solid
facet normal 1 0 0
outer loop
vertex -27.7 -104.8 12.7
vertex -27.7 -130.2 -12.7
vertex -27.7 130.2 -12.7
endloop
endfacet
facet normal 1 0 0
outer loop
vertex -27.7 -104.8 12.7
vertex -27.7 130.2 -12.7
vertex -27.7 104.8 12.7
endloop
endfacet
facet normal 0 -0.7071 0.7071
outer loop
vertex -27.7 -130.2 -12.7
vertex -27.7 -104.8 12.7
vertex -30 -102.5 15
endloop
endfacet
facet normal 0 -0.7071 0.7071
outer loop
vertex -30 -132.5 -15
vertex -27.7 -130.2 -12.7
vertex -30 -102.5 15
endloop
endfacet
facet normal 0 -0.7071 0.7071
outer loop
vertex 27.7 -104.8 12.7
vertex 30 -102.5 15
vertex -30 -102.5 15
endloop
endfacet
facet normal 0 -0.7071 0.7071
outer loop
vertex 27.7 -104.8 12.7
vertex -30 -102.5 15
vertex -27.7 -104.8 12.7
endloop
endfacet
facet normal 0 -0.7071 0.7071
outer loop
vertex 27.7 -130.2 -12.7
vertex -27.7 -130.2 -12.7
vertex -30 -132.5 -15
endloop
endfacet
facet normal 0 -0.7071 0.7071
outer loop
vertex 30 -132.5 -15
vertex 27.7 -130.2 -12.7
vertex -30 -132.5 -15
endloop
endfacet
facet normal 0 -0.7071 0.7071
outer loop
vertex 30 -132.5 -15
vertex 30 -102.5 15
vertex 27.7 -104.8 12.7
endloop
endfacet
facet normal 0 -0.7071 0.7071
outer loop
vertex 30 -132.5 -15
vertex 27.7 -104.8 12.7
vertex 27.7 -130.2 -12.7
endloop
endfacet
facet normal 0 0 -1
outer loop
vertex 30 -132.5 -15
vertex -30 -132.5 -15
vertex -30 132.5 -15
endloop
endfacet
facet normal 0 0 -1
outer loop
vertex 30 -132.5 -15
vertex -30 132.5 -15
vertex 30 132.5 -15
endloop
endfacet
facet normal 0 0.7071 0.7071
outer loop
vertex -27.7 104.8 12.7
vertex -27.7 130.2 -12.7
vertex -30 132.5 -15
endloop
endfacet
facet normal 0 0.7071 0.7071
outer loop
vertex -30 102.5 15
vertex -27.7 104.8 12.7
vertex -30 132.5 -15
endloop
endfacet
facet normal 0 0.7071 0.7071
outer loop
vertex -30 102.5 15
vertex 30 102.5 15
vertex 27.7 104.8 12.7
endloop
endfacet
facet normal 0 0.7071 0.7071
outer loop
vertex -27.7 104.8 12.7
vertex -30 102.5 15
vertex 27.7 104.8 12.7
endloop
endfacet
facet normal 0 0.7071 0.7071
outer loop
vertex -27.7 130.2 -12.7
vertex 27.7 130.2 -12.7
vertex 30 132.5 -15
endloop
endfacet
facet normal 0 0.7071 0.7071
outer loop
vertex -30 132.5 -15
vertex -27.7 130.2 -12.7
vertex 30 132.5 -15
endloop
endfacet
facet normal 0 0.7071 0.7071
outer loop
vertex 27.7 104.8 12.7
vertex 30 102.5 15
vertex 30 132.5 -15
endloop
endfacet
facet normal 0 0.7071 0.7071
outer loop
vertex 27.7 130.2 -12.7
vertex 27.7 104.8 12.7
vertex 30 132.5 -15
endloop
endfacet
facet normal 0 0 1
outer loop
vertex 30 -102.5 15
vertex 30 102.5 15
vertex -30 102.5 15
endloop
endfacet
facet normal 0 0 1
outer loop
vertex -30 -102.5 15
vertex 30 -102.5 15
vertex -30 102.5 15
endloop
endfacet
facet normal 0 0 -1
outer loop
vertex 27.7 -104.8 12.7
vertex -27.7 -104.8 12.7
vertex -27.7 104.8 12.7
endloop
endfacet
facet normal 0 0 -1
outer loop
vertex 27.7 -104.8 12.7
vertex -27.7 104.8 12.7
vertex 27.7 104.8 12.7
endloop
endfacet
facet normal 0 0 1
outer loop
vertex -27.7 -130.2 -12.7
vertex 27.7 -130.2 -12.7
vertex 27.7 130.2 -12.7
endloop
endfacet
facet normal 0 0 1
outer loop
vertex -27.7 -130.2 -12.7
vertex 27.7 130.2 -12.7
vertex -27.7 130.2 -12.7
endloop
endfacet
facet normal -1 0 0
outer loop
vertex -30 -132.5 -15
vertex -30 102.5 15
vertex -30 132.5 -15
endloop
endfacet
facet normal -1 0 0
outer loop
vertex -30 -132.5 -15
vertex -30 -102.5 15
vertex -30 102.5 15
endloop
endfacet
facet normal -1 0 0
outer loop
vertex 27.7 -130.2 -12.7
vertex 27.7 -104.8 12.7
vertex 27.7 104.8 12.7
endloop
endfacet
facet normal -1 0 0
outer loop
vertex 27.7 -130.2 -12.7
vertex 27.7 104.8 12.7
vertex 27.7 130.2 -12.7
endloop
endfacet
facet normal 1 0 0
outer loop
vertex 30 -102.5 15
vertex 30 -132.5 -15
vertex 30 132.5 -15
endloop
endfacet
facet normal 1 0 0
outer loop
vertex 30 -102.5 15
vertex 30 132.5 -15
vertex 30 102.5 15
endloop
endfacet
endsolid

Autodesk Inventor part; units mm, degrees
ref_plane "YZ Plane" through (0, 0, 0) normal (1, 0, 0) x (0, 1, 0)
ref_plane "XZ Plane" through (0, 0, 0) normal (0, 1, 0) x (-1, 0, 0)
ref_plane "XY Plane" through (0, 0, 0) normal (0, 0, 1) x (1, 0, 0)
sketch "スケッチ1" plane through (0, 0, 0) normal (0, 1, 0) x (-1, 0, 0)
  line L0 (-30, 15) -> (30, 15)
  line L1 (30, 15) -> (30, -15)
  line L2 (30, -15) -> (-30, -15)
  line L3 (-30, -15) -> (-30, 15)
  line L4 (-30, 15) -> (30, -15) construction
  line L5 (30, 15) -> (-30, -15) construction
  line L6 (27.7, -12.7) -> (27.7, 12.7)
  line L7 (27.7, 12.7) -> (-27.7, 12.7)
  line L8 (-27.7, 12.7) -> (-27.7, -12.7)
  line L9 (-27.7, -12.7) -> (27.7, -12.7)
  point P0 (0, 0)
  dimension "d0" = 60
  dimension "d1" = 30
  dimension "d2" = 2.3
extrude "押し出し1" add sketch "スケッチ1" along normal mid plane 265
chamfer "面取り1" distance 30 angle 45 2 edges at (0, 132.5, 15) (0, -132.5, 15)
properties part number "車輪受け"
